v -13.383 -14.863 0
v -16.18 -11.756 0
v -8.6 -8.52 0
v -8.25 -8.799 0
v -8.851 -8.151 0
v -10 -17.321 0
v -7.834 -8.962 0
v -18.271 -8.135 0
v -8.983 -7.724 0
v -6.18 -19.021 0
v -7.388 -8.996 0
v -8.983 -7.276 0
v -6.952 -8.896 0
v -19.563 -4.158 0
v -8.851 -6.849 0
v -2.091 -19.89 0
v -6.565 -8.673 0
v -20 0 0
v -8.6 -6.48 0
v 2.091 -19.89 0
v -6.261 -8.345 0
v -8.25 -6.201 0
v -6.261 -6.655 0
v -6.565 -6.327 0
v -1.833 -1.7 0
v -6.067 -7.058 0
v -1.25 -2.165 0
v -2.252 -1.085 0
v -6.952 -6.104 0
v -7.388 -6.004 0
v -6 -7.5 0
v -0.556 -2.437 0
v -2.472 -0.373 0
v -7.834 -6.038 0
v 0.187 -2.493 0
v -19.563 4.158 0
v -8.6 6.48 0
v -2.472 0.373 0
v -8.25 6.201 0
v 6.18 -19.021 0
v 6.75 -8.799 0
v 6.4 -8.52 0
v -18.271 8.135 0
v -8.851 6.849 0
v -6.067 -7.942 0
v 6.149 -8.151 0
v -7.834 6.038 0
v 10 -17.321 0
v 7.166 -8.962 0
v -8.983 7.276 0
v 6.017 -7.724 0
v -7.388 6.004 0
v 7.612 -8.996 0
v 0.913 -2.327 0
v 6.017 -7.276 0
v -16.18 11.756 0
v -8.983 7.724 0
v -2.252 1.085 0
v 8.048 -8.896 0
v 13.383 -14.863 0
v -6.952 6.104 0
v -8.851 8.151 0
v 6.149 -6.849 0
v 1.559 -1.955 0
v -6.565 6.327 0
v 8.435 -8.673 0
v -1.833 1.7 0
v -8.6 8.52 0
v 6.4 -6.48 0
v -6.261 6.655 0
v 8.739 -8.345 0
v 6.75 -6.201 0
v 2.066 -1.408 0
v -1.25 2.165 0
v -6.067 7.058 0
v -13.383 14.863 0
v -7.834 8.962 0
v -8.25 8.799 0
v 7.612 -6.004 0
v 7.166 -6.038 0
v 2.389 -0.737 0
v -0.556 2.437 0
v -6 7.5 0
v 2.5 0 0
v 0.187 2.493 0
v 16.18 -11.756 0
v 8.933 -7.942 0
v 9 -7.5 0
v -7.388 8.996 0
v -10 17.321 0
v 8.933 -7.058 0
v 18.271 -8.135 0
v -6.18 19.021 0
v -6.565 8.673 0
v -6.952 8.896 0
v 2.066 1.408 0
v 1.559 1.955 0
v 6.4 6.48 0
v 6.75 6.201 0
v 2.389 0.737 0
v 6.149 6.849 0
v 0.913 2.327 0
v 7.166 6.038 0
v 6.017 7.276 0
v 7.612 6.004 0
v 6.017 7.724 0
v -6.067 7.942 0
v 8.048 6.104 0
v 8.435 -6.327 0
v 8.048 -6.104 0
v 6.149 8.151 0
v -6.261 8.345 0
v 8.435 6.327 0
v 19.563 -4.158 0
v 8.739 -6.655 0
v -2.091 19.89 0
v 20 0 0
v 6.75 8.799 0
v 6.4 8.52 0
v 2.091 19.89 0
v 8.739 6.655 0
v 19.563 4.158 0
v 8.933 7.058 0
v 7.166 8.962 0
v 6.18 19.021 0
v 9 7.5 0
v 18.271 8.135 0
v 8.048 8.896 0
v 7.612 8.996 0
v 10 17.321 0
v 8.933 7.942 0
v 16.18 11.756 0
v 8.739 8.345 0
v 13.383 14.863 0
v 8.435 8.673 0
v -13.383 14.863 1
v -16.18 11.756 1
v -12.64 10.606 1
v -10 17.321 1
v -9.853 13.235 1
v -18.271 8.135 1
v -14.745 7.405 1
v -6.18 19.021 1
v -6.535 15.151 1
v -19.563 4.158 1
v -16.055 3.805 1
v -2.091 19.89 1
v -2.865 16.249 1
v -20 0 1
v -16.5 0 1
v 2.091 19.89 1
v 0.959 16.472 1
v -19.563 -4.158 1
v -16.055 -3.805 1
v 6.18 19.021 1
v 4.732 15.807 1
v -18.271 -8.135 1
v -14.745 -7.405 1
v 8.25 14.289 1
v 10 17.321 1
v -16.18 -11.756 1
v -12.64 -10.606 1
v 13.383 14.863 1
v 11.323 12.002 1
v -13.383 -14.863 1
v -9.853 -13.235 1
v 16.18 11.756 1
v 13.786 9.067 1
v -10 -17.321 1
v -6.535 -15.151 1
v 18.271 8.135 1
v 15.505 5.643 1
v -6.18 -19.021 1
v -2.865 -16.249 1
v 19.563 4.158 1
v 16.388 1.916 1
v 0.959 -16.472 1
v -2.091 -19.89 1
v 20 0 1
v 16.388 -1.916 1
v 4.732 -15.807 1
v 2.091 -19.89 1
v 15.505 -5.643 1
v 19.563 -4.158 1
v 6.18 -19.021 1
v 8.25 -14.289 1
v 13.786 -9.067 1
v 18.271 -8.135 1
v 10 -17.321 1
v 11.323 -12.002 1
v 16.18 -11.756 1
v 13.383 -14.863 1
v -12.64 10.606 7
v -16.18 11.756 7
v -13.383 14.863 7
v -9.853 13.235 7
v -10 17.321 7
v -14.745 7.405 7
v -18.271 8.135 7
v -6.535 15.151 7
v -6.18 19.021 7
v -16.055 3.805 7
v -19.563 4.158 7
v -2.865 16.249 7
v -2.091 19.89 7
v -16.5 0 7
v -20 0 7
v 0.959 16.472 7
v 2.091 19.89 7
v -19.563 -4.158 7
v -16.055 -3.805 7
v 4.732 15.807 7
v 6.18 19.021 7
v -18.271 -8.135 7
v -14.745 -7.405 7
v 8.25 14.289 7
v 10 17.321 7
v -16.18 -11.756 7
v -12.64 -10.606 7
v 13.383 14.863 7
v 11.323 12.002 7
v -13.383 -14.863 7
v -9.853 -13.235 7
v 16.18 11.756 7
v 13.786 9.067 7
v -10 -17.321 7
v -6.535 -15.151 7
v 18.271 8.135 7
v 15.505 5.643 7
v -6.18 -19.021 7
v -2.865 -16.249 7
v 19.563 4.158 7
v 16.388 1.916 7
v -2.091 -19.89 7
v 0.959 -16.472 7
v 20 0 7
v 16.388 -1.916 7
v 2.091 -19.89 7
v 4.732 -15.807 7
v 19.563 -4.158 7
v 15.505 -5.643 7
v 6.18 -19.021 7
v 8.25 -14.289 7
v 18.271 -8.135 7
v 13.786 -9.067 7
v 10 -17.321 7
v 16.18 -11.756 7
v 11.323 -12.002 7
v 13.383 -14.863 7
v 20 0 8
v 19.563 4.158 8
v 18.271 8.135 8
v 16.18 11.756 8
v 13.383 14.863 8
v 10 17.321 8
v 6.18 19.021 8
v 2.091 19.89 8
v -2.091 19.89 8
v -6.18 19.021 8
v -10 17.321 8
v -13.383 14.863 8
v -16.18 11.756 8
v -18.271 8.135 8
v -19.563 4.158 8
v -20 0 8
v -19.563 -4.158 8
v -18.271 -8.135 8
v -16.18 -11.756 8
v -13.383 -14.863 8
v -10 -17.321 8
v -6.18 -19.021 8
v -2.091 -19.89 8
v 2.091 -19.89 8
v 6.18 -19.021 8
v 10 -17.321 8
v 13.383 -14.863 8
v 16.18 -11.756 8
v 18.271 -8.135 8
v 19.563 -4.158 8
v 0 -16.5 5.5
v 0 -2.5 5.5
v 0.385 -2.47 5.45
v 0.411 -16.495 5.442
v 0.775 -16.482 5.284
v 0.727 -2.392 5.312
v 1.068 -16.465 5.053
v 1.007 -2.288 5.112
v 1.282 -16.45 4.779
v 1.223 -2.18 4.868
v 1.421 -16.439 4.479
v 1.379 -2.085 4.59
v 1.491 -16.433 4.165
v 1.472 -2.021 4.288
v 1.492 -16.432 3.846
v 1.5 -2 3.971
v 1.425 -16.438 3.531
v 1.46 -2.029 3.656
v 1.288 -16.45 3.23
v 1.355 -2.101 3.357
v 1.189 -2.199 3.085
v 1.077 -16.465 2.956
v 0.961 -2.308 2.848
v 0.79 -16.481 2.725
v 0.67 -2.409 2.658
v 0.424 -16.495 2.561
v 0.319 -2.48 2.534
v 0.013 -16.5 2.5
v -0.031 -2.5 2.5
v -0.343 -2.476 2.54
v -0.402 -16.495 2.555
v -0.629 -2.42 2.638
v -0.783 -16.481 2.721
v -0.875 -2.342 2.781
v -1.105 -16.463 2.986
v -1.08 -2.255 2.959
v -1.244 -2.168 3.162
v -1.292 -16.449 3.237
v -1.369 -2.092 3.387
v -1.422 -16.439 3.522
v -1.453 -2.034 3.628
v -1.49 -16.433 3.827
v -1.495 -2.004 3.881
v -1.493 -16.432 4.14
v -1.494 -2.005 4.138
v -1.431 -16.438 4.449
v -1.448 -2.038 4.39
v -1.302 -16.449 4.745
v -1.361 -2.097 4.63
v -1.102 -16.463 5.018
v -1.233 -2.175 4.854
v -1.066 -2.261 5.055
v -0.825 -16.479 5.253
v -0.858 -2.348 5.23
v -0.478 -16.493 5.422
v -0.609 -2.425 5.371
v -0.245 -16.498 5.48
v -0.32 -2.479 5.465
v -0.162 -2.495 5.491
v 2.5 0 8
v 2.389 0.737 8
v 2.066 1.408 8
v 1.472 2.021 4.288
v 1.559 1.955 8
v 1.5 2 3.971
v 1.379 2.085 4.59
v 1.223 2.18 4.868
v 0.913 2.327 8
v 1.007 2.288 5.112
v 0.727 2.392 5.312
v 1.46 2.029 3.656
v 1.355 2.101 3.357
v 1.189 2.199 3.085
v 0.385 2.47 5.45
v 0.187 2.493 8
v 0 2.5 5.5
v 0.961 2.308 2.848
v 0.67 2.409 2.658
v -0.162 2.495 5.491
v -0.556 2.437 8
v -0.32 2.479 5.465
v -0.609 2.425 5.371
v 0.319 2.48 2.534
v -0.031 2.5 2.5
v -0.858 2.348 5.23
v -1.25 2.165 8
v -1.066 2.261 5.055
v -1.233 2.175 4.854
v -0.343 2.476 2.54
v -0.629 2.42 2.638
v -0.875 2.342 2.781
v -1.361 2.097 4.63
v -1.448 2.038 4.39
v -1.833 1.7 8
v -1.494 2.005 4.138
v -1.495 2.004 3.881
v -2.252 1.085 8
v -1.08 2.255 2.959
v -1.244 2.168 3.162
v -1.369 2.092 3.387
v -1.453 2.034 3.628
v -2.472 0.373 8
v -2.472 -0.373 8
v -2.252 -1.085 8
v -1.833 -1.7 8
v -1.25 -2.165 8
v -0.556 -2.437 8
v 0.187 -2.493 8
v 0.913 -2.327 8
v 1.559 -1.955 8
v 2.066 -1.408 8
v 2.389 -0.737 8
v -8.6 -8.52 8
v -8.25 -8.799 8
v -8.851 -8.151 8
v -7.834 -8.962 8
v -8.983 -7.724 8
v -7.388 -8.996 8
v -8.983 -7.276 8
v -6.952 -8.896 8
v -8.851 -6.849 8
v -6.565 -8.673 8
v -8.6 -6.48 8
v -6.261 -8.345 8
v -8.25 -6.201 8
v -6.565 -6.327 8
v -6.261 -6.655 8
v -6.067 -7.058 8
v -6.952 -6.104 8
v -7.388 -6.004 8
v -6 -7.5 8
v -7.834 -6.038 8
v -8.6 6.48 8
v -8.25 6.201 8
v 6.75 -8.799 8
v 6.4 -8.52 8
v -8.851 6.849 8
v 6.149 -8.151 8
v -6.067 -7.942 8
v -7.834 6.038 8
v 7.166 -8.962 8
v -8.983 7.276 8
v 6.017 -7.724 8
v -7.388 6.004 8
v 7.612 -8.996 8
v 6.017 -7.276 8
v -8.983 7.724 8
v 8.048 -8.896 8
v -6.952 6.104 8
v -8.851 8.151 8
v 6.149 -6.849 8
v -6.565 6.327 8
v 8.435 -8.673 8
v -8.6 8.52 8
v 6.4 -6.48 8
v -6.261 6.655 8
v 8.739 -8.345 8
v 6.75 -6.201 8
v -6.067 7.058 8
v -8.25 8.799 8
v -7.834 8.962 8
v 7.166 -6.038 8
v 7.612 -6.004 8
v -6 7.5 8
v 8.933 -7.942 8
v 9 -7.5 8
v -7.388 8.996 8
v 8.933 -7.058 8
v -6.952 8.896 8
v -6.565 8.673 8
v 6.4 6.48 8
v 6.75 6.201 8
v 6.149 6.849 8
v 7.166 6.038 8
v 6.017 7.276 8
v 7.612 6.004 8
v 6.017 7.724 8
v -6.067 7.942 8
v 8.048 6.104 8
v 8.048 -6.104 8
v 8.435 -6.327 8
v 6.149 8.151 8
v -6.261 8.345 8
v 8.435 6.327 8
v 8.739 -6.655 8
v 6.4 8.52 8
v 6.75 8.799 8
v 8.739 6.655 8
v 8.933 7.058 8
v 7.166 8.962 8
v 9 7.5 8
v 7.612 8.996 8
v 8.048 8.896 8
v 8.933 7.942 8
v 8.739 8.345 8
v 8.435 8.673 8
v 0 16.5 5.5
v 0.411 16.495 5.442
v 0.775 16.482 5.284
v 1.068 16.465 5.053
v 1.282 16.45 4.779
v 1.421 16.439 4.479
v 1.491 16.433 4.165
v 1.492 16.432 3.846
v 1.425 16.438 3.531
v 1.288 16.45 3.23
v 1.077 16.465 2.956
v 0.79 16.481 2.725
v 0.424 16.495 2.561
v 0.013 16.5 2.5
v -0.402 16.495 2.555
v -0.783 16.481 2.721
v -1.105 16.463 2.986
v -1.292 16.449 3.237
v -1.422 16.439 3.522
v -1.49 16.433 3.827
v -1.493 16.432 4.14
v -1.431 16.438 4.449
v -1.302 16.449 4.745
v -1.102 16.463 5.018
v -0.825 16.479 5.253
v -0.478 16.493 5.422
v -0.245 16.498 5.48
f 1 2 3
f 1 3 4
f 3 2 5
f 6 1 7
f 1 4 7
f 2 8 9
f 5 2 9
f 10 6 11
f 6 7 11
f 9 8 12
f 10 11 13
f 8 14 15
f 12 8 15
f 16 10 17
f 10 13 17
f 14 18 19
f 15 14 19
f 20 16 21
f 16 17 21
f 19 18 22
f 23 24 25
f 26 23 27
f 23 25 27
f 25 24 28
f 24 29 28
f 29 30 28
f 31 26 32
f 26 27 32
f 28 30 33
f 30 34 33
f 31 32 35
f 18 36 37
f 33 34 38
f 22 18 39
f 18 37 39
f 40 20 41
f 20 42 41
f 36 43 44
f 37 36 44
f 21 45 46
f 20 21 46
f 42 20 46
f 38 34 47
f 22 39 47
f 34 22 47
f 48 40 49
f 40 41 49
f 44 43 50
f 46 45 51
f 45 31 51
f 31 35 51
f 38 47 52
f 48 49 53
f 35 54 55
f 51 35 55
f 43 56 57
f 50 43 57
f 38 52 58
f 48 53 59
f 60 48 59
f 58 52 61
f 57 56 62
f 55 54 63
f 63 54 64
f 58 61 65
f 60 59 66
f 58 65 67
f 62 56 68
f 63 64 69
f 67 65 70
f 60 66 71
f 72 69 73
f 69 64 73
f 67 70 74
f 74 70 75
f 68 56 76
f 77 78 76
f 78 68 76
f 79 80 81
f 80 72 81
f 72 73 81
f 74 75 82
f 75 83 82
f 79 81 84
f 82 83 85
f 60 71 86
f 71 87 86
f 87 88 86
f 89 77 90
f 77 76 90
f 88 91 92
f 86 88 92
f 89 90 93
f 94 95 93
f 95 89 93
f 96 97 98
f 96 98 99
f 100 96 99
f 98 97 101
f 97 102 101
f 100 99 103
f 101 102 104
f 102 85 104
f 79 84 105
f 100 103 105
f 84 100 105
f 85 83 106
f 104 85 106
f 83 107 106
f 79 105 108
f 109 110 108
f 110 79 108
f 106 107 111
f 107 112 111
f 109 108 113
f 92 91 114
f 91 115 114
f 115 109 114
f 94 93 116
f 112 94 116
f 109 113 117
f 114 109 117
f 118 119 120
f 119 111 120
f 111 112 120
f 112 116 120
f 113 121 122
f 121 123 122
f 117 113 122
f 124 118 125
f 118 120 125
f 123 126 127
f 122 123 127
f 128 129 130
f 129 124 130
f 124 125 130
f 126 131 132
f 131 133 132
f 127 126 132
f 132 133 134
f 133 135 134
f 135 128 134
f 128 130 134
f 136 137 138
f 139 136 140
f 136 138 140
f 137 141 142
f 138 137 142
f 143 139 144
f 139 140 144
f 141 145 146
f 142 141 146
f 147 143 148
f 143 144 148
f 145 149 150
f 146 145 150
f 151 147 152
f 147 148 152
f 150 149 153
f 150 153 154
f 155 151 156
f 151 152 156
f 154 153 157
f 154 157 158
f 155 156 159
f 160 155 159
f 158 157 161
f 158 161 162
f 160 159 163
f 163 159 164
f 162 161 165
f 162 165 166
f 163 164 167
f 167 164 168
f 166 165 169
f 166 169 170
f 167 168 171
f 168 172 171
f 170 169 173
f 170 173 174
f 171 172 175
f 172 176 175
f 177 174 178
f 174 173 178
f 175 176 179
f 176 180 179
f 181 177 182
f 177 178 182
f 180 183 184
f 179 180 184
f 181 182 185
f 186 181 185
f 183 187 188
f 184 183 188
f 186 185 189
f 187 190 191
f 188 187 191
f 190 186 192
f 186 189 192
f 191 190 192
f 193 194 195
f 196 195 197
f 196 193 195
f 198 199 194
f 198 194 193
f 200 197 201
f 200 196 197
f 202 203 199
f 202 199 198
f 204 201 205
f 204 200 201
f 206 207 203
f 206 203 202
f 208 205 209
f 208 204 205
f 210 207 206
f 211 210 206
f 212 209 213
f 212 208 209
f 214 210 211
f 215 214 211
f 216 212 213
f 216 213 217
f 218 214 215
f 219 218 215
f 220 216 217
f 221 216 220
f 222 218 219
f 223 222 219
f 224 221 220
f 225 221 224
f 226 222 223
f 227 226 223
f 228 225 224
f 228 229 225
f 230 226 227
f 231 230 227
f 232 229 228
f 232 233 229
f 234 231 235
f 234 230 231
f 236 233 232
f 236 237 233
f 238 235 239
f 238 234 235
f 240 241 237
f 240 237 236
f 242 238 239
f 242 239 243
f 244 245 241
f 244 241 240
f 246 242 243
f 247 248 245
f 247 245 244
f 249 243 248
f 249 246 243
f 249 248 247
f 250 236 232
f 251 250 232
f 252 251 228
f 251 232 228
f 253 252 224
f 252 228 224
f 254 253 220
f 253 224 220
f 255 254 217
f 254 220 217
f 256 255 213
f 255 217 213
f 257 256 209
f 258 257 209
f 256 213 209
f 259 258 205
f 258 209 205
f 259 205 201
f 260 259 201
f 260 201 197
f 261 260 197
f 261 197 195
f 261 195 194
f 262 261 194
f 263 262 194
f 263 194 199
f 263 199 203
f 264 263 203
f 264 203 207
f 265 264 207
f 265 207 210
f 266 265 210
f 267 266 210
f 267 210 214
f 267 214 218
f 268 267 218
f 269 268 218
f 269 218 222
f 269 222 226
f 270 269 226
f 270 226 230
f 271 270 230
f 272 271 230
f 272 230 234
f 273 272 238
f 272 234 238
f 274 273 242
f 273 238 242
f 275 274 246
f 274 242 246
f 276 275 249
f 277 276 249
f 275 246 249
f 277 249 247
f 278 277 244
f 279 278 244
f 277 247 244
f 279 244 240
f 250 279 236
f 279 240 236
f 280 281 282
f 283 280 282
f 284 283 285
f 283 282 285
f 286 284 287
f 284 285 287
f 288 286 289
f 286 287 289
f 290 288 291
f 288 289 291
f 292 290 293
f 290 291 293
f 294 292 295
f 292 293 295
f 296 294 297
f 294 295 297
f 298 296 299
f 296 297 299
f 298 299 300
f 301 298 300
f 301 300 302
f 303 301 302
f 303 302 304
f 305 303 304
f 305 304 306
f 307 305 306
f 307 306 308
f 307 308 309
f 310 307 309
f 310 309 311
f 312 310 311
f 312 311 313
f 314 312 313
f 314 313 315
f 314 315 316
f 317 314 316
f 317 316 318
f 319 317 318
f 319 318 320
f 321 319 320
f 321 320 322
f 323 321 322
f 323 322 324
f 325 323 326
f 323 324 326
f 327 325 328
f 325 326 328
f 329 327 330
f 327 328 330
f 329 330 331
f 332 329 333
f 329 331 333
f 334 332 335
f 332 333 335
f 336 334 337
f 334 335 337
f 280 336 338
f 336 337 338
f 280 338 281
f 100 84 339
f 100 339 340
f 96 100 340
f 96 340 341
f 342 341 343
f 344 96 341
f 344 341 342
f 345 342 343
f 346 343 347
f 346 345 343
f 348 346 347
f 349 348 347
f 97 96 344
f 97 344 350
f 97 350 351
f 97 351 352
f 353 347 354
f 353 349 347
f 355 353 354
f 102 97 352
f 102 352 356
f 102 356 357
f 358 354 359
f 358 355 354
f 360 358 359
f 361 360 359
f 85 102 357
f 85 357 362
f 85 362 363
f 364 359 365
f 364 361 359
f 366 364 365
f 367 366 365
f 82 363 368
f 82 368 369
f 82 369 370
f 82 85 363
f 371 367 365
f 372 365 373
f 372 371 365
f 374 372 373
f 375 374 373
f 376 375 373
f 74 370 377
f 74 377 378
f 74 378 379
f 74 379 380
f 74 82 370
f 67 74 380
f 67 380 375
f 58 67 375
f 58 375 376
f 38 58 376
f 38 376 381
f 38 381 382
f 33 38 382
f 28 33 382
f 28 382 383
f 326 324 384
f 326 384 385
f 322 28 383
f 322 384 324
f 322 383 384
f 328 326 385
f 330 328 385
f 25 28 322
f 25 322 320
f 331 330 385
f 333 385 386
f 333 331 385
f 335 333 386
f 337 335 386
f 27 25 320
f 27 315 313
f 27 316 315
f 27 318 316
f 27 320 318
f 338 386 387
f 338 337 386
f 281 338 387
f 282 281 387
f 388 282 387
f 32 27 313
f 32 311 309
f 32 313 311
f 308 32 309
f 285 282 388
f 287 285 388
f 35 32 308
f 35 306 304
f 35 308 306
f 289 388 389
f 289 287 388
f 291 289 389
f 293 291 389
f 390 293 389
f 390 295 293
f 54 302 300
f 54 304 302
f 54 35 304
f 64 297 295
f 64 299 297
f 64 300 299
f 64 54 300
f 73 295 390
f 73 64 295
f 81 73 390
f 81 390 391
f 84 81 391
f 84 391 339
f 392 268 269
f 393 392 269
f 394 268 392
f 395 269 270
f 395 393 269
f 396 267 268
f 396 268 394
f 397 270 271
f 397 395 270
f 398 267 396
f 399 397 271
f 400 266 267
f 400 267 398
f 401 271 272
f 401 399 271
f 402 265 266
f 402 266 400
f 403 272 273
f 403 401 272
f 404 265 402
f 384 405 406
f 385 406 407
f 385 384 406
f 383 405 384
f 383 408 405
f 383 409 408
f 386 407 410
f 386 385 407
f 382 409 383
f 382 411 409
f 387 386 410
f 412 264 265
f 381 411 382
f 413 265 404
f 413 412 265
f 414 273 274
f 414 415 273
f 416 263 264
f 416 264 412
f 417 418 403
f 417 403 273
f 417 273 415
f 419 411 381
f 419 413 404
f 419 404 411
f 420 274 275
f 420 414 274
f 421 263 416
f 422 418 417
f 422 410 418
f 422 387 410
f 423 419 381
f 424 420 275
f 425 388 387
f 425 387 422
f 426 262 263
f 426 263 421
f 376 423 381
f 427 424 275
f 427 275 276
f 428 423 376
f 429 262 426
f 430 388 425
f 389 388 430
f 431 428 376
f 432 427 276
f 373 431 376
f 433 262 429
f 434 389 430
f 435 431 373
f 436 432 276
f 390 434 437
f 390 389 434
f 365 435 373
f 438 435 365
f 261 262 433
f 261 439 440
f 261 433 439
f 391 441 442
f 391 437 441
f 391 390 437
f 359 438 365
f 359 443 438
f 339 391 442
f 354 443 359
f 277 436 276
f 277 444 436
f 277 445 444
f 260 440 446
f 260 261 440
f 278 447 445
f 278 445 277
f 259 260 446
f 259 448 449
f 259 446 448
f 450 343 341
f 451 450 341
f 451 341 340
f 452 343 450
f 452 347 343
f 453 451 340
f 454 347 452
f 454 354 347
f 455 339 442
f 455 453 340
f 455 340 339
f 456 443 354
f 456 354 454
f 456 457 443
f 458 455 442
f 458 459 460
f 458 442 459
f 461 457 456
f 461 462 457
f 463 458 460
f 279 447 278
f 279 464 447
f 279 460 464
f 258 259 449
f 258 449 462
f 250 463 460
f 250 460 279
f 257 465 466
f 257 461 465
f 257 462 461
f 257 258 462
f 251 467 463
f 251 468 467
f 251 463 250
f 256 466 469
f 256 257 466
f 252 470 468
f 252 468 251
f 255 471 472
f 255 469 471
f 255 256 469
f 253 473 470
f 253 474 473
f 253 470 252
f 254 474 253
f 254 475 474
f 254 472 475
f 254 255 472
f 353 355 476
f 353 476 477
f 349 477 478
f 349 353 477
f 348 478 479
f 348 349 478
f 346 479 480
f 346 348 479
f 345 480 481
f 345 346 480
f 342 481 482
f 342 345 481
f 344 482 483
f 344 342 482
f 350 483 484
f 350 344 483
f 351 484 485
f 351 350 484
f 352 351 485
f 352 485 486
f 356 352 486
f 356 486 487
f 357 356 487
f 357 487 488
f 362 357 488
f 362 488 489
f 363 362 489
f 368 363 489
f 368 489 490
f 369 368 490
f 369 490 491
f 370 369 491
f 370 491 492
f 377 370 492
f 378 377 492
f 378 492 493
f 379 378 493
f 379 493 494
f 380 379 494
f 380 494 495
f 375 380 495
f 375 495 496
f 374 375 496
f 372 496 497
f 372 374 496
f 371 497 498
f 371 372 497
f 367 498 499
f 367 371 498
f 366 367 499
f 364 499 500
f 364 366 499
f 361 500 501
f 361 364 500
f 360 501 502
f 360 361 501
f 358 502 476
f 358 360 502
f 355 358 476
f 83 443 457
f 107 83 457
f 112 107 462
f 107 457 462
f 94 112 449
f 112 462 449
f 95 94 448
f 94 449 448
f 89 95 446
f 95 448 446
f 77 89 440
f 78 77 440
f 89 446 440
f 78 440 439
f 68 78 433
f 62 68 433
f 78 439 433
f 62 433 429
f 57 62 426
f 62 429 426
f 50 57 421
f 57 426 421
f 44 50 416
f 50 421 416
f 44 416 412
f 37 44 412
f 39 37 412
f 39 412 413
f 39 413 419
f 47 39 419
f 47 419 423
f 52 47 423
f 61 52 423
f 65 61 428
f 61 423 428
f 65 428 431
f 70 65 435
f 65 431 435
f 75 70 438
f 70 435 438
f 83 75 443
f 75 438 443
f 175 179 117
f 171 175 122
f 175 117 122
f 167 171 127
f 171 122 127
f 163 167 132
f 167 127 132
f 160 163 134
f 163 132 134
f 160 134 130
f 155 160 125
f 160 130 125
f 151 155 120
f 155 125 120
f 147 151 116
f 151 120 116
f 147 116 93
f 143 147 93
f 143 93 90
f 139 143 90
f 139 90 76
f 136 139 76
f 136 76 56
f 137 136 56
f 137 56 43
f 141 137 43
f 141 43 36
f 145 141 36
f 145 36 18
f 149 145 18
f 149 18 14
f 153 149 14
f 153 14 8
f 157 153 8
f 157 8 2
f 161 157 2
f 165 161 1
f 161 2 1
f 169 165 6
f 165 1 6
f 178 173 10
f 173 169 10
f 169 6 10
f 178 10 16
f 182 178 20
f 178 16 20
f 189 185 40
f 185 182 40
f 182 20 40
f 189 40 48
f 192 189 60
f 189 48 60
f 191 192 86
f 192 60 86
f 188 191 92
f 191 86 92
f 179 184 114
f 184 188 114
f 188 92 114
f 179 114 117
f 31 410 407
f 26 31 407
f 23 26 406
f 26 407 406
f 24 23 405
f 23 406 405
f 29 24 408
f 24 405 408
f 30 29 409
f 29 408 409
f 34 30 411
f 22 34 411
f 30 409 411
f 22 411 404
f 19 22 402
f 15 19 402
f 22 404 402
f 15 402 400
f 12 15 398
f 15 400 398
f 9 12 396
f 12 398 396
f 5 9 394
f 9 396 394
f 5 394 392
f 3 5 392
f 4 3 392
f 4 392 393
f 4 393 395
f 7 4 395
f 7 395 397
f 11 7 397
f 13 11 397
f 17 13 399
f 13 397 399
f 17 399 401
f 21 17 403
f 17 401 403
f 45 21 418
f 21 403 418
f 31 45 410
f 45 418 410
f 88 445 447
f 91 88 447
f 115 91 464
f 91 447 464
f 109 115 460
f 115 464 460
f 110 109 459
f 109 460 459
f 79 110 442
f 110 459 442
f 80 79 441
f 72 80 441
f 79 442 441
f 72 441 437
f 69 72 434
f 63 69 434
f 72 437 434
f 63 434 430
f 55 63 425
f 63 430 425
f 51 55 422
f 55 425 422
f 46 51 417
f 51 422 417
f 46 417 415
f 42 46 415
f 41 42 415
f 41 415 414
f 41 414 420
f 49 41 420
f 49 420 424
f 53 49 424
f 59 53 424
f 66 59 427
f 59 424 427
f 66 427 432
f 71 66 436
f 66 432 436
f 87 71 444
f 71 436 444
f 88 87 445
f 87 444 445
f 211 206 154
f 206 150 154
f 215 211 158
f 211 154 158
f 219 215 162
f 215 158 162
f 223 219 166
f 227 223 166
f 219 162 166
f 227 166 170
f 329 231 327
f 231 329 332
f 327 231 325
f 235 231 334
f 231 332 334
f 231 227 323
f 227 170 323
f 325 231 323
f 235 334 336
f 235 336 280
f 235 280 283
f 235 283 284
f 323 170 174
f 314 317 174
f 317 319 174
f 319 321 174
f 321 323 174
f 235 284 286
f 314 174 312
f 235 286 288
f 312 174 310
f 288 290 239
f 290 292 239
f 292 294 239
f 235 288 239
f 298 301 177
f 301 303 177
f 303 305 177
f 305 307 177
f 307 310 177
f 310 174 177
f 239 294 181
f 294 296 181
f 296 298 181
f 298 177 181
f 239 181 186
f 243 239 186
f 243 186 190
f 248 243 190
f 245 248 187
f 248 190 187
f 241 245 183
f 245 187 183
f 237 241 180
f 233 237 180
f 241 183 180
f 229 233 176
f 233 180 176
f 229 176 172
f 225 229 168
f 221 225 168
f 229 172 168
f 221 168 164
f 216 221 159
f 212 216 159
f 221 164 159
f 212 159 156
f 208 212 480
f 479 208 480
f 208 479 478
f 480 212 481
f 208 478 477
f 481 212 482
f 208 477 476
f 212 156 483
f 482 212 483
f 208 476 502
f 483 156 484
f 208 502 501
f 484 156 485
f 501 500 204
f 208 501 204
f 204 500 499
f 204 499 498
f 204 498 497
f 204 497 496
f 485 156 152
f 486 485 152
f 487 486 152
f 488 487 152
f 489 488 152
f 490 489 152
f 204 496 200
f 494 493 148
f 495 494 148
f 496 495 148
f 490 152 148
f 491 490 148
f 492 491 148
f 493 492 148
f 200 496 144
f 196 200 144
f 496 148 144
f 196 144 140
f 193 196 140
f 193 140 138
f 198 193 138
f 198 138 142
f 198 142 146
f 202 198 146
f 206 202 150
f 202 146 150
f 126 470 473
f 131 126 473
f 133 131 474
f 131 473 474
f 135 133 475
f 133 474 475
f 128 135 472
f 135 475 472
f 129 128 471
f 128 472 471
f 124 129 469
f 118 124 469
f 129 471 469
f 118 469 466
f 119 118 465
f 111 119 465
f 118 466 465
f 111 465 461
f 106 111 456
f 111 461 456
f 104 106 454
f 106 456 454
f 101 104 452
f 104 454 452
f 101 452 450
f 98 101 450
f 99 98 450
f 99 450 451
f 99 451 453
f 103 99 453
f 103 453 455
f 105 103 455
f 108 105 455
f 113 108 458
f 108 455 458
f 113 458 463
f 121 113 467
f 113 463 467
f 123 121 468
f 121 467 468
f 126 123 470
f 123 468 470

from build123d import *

# Parameters (mm, degrees)
SKETCH1_R                                       = 20
PULLEY_BOSS_EXTRUDE1_DEPTH                      = 8
SKETCH2_W                                       = 3.5
SKETCH2_H                                       = 6
SKETCH3_R                                       = 2.5
SHAFT_CUT_EXTRUDE1_DEPTH                        = 8
SPRINT_HOLE_CUT_EXTRUDE2_REACH                  = 31.394
SPRINT_HOLE_CUT_EXTRUDE2_END_RADIUS             = 16.5
SKETCH4_R                                       = 1.5
SPRINT_HOLE_CUT_EXTRUDE2_DIRECTION_2_REACH      = 31.394
SPRINT_HOLE_CUT_EXTRUDE2_DIRECTION_2_END_RADIUS = 16.5
SKETCH5_R                                       = 1.5
ARM_DISTANS_MOUNTING_HOLES_CUT_EXTRUDE1_DEPTH   = 8


with BuildPart() as part:
    # Sketch1 → Pulley Boss-Extrude1 (new body)
    with BuildSketch(Plane.XY):
        Circle(SKETCH1_R)
    extrude(amount=PULLEY_BOSS_EXTRUDE1_DEPTH)

    # Sketch2 → Belt Cut-Revolve3 (revolve, cut)
    with BuildSketch(Plane(origin=(0, 0, 0), x_dir=(1, 0, 0), z_dir=(0, 1, 0)), mode=Mode.PRIVATE) as belt_cut_revolve3_sk:
        with Locations((18.25, -4)):
            Rectangle(SKETCH2_W, SKETCH2_H)
    revolve(belt_cut_revolve3_sk.sketch.rotate(Axis((0, 0, -14.62158436), (0, 0, 1)), 180), axis=Axis((0, 0, -14.62158436), (0, 0, 1)), mode=Mode.SUBTRACT)

    # Sketch3 → Shaft Cut-Extrude1 (cut)
    with BuildSketch(Plane.XY):
        Circle(SKETCH3_R)
    extrude(amount=SHAFT_CUT_EXTRUDE1_DEPTH, mode=Mode.SUBTRACT)

    # Sprint Hole Cut-Extrude2: up to this cylinder (the profile starts inside it)
    sprint_hole_cut_extrude2_end = Plane(origin=(0, 0, 4), z_dir=(0, 0, -1)) * Cylinder(SPRINT_HOLE_CUT_EXTRUDE2_END_RADIUS, 96.788, mode=Mode.PRIVATE)
    # Sketch4 → Sprint Hole Cut-Extrude2 (cut, up to the surface)
    with BuildSketch(Plane(origin=(0, 0, 0), x_dir=(1, 0, 0), z_dir=(0, 1, 0)), mode=Mode.PRIVATE) as sprint_hole_cut_extrude2_sk1:
        with Locations(Location((0, -4, 0), (0, 0, 270))):
            Circle(SKETCH4_R)
    sprint_hole_cut_extrude2_tool1 = extrude(sprint_hole_cut_extrude2_sk1.sketch, amount=-SPRINT_HOLE_CUT_EXTRUDE2_REACH, mode=Mode.PRIVATE) & sprint_hole_cut_extrude2_end
    add(sprint_hole_cut_extrude2_tool1.solids().sort_by_distance((0, 0, 4))[0], mode=Mode.SUBTRACT)

    # Sprint Hole Cut-Extrude2 direction 2: up to this cylinder (the profile starts inside it)
    sprint_hole_cut_extrude2_direction_2_end = Plane(origin=(0, 0, 4), z_dir=(0, 0, -1)) * Cylinder(SPRINT_HOLE_CUT_EXTRUDE2_DIRECTION_2_END_RADIUS, 96.788, mode=Mode.PRIVATE)
    # Sketch4 → Sprint Hole Cut-Extrude2 direction 2 (cut, up to the surface)
    with BuildSketch(Plane(origin=(0, 0, 0), x_dir=(1, 0, 0), z_dir=(0, 1, 0)), mode=Mode.PRIVATE) as sprint_hole_cut_extrude2_direction_2_sk1:
        with Locations(Location((0, -4, 0), (0, 0, 270))):
            Circle(SKETCH4_R)
    sprint_hole_cut_extrude2_direction_2_tool1 = extrude(sprint_hole_cut_extrude2_direction_2_sk1.sketch, amount=SPRINT_HOLE_CUT_EXTRUDE2_DIRECTION_2_REACH, mode=Mode.PRIVATE) & sprint_hole_cut_extrude2_direction_2_end
    add(sprint_hole_cut_extrude2_direction_2_tool1.solids().sort_by_distance((0, 0, 4))[0], mode=Mode.SUBTRACT)

    # Sketch5 → Arm Distans Mounting Holes Cut-Extrude1 (cut)
    with BuildSketch(Plane.XY.offset(8)):
        with Locations((7.5, 7.5)):
            Circle(SKETCH5_R)
        with Locations((-7.5, 7.5)):
            Circle(SKETCH5_R)
        with Locations((-7.5, -7.5)):
            Circle(SKETCH5_R)
        with Locations((7.5, -7.5)):
            Circle(SKETCH5_R)
    extrude(amount=-ARM_DISTANS_MOUNTING_HOLES_CUT_EXTRUDE1_DEPTH, mode=Mode.SUBTRACT)


solid = part.part
